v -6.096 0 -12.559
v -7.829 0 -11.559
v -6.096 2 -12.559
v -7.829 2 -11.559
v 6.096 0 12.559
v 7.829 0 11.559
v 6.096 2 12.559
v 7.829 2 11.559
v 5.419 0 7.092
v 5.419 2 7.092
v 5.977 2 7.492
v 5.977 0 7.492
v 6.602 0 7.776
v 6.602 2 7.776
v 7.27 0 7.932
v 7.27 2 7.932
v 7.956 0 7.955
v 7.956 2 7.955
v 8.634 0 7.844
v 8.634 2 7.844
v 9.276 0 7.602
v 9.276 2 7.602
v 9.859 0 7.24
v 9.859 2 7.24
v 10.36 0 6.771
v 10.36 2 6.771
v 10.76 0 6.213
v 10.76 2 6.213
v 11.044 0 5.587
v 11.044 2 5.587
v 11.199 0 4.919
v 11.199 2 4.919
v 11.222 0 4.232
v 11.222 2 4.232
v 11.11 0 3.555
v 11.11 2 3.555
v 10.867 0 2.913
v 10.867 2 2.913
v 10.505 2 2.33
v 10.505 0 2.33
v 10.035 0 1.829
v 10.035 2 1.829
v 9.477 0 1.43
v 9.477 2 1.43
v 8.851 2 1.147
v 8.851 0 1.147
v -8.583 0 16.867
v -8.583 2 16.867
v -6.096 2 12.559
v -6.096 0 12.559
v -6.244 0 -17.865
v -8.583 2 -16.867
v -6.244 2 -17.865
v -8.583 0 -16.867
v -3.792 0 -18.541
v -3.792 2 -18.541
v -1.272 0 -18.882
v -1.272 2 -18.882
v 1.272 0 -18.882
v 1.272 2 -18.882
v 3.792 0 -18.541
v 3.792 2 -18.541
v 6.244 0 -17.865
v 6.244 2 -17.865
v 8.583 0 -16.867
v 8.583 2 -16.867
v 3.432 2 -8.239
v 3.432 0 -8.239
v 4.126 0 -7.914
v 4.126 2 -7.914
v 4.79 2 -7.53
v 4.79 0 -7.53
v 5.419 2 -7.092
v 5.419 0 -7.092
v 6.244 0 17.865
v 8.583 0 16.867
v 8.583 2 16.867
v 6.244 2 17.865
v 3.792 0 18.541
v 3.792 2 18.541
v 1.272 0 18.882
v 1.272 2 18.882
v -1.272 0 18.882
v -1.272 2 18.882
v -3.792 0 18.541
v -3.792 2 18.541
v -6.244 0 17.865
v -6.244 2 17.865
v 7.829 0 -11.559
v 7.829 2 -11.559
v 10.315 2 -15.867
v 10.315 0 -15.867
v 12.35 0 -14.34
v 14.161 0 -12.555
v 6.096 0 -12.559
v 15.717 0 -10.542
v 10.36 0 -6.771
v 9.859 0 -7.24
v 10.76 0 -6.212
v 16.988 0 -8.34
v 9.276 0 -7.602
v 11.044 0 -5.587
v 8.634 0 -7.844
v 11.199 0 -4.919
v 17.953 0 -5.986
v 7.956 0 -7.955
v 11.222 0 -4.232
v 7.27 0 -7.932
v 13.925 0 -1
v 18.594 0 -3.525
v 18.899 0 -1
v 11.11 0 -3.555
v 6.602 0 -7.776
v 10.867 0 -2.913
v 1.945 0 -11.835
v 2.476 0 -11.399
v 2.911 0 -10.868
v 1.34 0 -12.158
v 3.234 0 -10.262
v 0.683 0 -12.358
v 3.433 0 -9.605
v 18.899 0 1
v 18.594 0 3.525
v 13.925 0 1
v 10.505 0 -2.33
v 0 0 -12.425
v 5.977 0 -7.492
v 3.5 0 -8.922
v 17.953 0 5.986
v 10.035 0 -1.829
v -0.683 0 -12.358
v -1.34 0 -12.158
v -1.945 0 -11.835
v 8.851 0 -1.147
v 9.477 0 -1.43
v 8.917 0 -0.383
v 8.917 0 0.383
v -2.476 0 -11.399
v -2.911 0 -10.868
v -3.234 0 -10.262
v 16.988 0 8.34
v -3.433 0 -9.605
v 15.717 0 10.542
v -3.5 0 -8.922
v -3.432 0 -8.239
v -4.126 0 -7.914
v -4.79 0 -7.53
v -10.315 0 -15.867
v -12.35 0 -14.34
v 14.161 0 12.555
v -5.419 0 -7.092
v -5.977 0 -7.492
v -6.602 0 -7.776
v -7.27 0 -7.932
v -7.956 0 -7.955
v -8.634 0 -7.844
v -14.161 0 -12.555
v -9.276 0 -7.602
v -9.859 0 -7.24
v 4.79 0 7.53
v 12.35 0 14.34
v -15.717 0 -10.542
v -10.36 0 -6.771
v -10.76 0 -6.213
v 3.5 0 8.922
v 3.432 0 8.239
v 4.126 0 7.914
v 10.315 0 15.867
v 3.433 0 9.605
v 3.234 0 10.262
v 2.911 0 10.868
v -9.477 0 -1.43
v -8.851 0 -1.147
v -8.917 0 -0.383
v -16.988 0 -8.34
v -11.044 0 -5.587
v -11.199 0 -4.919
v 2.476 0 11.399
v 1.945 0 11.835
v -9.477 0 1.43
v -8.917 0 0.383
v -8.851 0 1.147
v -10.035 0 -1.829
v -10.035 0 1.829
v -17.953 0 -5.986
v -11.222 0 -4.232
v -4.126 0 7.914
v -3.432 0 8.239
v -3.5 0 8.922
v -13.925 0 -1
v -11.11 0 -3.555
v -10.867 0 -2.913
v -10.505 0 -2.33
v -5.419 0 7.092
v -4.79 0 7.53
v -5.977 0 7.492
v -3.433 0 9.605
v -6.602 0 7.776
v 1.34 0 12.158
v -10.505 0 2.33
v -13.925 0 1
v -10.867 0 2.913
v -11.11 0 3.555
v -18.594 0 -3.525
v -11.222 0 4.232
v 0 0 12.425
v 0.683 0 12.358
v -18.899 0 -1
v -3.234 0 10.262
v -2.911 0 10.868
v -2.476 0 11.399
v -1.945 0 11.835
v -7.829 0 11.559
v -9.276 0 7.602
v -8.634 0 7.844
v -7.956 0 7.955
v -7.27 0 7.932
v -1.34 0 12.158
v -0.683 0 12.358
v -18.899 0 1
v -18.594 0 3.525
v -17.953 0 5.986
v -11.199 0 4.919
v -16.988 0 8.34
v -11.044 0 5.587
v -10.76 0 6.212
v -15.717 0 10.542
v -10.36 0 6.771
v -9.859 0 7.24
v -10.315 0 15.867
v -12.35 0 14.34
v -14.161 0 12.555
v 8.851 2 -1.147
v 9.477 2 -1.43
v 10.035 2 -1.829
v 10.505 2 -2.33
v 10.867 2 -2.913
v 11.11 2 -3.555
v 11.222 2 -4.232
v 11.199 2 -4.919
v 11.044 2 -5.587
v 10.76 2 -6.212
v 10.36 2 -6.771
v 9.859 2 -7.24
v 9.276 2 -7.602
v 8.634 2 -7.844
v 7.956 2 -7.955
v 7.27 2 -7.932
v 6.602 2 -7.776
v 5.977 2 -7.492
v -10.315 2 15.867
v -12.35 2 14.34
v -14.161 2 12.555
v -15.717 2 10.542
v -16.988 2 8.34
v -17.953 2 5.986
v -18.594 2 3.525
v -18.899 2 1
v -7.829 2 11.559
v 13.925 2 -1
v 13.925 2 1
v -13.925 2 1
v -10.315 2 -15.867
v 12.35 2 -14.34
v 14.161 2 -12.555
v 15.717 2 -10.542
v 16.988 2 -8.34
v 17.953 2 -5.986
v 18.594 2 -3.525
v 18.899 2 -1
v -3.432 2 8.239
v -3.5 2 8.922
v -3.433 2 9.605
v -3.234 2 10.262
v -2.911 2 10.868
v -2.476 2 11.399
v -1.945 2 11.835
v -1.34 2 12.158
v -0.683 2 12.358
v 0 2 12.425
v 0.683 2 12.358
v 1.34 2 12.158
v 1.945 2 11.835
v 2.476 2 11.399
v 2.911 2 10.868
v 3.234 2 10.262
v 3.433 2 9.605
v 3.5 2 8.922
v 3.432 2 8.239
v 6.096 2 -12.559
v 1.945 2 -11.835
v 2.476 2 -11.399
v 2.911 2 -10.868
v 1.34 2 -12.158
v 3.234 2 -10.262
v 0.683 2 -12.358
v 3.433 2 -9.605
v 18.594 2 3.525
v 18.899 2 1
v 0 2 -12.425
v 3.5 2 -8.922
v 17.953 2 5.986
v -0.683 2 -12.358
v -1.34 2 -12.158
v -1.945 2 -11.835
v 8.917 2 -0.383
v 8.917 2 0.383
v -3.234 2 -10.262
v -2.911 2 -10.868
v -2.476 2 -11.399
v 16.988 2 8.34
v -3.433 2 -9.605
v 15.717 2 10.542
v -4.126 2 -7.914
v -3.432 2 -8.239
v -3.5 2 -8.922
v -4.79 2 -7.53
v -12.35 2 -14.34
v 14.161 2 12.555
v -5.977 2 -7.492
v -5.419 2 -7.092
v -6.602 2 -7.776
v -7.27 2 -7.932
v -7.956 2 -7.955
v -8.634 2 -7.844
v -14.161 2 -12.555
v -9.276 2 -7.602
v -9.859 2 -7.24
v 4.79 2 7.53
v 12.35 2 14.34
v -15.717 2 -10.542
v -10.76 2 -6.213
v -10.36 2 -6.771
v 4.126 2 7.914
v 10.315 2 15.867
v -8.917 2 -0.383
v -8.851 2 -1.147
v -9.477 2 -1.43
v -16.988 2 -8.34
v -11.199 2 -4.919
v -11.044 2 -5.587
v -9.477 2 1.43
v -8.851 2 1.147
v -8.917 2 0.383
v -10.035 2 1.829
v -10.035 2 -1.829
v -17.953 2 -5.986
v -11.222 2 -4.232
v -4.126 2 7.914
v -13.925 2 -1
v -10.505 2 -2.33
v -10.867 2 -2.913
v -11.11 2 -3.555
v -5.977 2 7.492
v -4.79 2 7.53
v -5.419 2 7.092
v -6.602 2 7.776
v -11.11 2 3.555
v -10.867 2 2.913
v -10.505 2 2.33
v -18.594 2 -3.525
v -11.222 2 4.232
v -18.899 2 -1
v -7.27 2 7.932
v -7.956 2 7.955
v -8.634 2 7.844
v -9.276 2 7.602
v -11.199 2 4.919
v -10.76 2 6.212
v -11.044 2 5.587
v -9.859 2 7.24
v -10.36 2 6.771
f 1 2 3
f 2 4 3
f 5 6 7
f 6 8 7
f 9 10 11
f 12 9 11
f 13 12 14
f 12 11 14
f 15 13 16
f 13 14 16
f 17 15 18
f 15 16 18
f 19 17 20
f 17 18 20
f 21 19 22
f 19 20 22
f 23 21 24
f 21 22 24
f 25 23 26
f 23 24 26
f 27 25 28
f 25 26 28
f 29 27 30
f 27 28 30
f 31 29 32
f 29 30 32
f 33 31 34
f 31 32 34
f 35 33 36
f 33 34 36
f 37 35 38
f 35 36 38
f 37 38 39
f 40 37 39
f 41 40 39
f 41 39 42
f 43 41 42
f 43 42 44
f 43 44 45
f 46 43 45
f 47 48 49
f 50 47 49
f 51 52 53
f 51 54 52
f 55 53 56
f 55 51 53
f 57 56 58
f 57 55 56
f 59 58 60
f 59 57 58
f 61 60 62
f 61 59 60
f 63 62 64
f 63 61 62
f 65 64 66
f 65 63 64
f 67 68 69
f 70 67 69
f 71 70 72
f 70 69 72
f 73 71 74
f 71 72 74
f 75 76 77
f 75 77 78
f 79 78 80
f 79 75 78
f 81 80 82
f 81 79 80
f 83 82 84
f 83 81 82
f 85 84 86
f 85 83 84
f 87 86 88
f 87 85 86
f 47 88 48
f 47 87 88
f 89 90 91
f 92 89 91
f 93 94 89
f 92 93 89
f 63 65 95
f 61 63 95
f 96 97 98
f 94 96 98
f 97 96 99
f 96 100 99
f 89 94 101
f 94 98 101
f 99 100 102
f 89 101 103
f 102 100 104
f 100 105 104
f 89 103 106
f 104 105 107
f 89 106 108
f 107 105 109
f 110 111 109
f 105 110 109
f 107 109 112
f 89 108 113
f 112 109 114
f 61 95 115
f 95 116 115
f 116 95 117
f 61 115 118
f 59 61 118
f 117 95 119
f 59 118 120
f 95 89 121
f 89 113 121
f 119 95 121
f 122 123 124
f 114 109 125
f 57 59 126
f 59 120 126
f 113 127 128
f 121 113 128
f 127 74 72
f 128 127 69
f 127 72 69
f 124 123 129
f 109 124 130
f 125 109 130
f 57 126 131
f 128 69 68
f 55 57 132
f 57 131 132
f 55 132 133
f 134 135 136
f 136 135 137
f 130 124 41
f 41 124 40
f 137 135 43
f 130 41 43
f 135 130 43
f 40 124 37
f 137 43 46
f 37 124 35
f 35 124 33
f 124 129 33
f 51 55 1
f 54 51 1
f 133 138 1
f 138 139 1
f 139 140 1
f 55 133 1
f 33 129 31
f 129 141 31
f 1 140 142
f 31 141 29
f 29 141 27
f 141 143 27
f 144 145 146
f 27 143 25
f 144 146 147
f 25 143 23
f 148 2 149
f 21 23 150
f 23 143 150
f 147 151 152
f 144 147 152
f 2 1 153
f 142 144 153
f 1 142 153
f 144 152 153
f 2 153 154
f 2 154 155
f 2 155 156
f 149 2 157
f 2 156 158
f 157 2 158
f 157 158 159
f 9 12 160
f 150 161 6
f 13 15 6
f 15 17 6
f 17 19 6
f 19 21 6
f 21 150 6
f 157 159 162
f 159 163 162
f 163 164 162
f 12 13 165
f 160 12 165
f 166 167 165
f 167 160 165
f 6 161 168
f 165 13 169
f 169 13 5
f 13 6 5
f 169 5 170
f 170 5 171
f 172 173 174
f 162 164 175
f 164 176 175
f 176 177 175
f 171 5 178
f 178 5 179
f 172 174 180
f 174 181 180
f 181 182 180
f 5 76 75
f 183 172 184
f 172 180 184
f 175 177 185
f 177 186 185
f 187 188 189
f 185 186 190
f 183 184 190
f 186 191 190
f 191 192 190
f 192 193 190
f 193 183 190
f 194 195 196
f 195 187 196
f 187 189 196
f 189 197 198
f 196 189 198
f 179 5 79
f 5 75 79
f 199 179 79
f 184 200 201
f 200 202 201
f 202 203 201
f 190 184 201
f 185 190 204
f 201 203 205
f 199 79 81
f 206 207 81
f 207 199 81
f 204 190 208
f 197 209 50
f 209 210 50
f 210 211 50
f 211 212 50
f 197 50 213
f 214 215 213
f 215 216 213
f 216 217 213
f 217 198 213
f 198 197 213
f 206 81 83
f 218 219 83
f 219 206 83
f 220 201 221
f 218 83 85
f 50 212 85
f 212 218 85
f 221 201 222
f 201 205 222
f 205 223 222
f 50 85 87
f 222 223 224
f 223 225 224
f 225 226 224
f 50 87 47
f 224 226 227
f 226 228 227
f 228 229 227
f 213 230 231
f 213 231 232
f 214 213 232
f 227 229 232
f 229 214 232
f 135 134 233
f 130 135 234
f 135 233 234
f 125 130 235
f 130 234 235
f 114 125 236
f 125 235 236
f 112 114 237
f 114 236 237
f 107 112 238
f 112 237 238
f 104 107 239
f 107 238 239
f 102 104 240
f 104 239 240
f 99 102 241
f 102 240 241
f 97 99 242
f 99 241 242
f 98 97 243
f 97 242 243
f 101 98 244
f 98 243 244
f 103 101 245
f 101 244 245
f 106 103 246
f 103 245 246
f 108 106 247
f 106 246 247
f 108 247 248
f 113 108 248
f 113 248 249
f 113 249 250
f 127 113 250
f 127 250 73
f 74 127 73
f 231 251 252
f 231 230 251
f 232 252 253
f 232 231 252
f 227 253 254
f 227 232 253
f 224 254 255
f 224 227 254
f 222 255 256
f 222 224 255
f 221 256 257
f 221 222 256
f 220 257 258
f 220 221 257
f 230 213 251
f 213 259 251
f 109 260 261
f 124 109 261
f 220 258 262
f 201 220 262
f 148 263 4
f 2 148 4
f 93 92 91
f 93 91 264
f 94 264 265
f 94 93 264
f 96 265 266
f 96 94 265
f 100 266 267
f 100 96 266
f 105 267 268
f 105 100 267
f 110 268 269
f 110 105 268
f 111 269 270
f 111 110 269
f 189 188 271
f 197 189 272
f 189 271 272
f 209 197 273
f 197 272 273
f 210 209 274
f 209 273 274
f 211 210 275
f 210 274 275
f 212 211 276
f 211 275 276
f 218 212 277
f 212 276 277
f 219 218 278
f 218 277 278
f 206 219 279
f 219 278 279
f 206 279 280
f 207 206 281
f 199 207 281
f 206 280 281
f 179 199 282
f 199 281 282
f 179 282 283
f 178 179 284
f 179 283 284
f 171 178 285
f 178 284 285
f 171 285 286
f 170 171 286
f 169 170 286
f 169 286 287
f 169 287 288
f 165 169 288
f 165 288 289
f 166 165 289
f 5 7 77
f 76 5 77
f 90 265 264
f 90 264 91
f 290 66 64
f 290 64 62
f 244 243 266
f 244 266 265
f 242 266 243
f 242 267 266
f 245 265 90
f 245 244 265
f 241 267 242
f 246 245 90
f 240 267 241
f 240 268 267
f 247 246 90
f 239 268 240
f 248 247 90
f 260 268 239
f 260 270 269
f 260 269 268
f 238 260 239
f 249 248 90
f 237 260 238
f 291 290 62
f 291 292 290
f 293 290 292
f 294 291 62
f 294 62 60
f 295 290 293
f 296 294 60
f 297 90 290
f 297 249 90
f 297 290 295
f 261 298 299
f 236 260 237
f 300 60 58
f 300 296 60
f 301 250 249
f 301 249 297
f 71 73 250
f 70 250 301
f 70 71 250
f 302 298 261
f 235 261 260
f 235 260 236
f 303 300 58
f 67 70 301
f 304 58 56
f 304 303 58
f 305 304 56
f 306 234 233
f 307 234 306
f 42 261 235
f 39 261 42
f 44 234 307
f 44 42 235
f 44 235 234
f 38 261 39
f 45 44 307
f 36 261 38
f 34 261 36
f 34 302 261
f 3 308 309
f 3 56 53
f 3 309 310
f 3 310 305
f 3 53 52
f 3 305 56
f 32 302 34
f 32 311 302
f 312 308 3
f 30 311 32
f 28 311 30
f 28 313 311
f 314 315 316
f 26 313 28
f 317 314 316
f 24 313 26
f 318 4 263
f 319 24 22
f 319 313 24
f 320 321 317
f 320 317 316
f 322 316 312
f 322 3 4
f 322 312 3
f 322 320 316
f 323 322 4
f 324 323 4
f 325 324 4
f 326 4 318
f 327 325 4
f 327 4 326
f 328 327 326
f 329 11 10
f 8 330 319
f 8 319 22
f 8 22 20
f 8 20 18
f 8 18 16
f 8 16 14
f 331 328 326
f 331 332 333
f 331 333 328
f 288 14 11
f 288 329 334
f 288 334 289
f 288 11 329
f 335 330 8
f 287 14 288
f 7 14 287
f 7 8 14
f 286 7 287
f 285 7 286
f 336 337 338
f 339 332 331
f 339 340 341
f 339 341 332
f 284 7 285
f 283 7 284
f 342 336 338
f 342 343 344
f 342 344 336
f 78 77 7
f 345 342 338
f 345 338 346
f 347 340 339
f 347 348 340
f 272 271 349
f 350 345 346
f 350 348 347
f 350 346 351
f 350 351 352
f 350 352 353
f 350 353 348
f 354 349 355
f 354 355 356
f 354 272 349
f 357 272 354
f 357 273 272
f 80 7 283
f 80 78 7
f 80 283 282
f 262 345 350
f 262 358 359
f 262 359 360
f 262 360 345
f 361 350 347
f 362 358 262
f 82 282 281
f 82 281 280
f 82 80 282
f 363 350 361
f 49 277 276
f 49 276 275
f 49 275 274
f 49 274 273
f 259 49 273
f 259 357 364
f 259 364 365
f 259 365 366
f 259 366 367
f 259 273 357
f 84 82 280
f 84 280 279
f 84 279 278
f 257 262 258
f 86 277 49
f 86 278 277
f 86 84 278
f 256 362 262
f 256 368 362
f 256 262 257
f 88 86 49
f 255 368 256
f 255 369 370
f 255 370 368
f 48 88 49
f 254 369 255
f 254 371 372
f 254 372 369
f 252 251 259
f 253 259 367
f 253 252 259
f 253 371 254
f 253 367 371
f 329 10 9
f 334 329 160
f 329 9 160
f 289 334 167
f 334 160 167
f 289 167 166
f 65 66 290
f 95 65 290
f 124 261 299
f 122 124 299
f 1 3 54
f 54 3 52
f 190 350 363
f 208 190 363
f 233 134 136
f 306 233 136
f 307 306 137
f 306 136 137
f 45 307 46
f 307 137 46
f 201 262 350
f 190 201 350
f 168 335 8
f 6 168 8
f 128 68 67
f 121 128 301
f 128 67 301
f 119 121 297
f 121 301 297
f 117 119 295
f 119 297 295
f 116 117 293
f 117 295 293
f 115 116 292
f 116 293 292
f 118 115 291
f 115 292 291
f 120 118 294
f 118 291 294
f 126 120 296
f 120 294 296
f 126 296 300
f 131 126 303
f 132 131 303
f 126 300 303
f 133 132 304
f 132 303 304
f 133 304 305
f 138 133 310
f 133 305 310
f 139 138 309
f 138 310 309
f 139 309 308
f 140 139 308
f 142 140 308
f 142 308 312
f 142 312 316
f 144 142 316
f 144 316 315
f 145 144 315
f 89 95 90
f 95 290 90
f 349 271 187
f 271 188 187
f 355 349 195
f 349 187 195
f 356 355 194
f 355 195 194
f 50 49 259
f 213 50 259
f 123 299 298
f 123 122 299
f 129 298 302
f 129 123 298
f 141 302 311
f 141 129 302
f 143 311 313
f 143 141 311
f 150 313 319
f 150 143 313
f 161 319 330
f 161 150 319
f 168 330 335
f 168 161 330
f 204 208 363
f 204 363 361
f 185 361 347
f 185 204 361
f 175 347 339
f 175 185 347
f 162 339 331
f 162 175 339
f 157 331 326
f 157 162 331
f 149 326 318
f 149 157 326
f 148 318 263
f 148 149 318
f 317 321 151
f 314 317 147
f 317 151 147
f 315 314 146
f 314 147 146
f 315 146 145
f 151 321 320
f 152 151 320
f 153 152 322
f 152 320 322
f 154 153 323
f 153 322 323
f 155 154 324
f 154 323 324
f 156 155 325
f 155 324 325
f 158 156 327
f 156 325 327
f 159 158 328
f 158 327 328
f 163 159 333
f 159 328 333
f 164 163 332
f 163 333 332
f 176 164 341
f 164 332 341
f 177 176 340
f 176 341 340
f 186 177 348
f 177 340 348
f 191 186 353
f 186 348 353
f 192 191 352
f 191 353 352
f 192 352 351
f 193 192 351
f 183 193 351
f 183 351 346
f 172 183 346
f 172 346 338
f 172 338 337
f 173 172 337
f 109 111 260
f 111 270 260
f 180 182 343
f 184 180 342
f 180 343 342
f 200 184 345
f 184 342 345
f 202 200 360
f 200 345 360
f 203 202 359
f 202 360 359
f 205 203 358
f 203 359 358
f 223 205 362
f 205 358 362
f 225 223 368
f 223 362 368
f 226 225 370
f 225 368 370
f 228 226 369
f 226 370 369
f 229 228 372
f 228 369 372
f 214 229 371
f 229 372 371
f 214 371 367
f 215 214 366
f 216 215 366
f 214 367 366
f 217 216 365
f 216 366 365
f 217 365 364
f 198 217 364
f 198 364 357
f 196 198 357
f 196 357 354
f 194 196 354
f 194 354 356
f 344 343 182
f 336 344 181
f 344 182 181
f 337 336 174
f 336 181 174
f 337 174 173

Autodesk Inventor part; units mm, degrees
ref_plane "YZ Plane" through (0, 0, 0) normal (1, 0, 0) x (0, 1, 0)
ref_plane "XZ Plane" through (0, 0, 0) normal (0, 1, 0) x (-1, 0, 0)
ref_plane "XY Plane" through (0, 0, 0) normal (0, 0, 1) x (1, 0, 0)
sketch "Sketch1" plane through (0, 0, 0) normal (0, 1, 0) x (-1, 0, 0)
  circle A0 centre (0, 0) radius 18.925
  circle A1 centre (0, 0) radius 8.925
  dimension "d0" = 37.85
  dimension "d1" = 17.85
extrude "Extrusion1" add sketch "Sketch1" along normal blind 2
sketch "Sketch2" plane through (0, 2, 0) normal (0, 1, 0) x (1, 0, 0)
  line L0 (-23.925, -1) -> (-13.925, -1)
  line L1 (-13.925, -1) -> (-13.925, 1)
  line L2 (-13.925, 1) -> (-23.925, 1)
  line L3 (-23.925, 1) -> (-23.925, -1)
  point P0 (0, 0)
  dimension "d4" = 1
  dimension "d5" = 2
  dimension "d6" = 13.925
  dimension "d7" = 10
extrude "Extrusion2" cut sketch "Sketch2" against normal blind 2
pattern_circular "Circular Pattern1" count 6 over 360 about axis through (0, -10, 0) along (0, 1, 0) of "Extrusion2"
sketch "Sketch3" plane through (0, 2, 0) normal (0, 1, 0) x (1, 0, 0)
  circle A0 centre (-7.7293, -4.4625) radius 3.5
  line L0 (-7.7293, -4.4625) -> (0, 0) construction
  circle A1 centre (0, 0) radius 8.925 projected
  line L1 (-26.458, 0) -> (26.458, 0) projected
  dimension "d13" = 30
  dimension "d14" = 7
extrude "Extrusion3" cut sketch "Sketch3" against normal blind 2 contours A0 A1 | A1 A0
pattern_circular "Circular Pattern2" count 6 over 360 about axis through (0, -10, 0) along (0, 1, 0) of "Extrusion3"
properties part number "Ring_n6"
